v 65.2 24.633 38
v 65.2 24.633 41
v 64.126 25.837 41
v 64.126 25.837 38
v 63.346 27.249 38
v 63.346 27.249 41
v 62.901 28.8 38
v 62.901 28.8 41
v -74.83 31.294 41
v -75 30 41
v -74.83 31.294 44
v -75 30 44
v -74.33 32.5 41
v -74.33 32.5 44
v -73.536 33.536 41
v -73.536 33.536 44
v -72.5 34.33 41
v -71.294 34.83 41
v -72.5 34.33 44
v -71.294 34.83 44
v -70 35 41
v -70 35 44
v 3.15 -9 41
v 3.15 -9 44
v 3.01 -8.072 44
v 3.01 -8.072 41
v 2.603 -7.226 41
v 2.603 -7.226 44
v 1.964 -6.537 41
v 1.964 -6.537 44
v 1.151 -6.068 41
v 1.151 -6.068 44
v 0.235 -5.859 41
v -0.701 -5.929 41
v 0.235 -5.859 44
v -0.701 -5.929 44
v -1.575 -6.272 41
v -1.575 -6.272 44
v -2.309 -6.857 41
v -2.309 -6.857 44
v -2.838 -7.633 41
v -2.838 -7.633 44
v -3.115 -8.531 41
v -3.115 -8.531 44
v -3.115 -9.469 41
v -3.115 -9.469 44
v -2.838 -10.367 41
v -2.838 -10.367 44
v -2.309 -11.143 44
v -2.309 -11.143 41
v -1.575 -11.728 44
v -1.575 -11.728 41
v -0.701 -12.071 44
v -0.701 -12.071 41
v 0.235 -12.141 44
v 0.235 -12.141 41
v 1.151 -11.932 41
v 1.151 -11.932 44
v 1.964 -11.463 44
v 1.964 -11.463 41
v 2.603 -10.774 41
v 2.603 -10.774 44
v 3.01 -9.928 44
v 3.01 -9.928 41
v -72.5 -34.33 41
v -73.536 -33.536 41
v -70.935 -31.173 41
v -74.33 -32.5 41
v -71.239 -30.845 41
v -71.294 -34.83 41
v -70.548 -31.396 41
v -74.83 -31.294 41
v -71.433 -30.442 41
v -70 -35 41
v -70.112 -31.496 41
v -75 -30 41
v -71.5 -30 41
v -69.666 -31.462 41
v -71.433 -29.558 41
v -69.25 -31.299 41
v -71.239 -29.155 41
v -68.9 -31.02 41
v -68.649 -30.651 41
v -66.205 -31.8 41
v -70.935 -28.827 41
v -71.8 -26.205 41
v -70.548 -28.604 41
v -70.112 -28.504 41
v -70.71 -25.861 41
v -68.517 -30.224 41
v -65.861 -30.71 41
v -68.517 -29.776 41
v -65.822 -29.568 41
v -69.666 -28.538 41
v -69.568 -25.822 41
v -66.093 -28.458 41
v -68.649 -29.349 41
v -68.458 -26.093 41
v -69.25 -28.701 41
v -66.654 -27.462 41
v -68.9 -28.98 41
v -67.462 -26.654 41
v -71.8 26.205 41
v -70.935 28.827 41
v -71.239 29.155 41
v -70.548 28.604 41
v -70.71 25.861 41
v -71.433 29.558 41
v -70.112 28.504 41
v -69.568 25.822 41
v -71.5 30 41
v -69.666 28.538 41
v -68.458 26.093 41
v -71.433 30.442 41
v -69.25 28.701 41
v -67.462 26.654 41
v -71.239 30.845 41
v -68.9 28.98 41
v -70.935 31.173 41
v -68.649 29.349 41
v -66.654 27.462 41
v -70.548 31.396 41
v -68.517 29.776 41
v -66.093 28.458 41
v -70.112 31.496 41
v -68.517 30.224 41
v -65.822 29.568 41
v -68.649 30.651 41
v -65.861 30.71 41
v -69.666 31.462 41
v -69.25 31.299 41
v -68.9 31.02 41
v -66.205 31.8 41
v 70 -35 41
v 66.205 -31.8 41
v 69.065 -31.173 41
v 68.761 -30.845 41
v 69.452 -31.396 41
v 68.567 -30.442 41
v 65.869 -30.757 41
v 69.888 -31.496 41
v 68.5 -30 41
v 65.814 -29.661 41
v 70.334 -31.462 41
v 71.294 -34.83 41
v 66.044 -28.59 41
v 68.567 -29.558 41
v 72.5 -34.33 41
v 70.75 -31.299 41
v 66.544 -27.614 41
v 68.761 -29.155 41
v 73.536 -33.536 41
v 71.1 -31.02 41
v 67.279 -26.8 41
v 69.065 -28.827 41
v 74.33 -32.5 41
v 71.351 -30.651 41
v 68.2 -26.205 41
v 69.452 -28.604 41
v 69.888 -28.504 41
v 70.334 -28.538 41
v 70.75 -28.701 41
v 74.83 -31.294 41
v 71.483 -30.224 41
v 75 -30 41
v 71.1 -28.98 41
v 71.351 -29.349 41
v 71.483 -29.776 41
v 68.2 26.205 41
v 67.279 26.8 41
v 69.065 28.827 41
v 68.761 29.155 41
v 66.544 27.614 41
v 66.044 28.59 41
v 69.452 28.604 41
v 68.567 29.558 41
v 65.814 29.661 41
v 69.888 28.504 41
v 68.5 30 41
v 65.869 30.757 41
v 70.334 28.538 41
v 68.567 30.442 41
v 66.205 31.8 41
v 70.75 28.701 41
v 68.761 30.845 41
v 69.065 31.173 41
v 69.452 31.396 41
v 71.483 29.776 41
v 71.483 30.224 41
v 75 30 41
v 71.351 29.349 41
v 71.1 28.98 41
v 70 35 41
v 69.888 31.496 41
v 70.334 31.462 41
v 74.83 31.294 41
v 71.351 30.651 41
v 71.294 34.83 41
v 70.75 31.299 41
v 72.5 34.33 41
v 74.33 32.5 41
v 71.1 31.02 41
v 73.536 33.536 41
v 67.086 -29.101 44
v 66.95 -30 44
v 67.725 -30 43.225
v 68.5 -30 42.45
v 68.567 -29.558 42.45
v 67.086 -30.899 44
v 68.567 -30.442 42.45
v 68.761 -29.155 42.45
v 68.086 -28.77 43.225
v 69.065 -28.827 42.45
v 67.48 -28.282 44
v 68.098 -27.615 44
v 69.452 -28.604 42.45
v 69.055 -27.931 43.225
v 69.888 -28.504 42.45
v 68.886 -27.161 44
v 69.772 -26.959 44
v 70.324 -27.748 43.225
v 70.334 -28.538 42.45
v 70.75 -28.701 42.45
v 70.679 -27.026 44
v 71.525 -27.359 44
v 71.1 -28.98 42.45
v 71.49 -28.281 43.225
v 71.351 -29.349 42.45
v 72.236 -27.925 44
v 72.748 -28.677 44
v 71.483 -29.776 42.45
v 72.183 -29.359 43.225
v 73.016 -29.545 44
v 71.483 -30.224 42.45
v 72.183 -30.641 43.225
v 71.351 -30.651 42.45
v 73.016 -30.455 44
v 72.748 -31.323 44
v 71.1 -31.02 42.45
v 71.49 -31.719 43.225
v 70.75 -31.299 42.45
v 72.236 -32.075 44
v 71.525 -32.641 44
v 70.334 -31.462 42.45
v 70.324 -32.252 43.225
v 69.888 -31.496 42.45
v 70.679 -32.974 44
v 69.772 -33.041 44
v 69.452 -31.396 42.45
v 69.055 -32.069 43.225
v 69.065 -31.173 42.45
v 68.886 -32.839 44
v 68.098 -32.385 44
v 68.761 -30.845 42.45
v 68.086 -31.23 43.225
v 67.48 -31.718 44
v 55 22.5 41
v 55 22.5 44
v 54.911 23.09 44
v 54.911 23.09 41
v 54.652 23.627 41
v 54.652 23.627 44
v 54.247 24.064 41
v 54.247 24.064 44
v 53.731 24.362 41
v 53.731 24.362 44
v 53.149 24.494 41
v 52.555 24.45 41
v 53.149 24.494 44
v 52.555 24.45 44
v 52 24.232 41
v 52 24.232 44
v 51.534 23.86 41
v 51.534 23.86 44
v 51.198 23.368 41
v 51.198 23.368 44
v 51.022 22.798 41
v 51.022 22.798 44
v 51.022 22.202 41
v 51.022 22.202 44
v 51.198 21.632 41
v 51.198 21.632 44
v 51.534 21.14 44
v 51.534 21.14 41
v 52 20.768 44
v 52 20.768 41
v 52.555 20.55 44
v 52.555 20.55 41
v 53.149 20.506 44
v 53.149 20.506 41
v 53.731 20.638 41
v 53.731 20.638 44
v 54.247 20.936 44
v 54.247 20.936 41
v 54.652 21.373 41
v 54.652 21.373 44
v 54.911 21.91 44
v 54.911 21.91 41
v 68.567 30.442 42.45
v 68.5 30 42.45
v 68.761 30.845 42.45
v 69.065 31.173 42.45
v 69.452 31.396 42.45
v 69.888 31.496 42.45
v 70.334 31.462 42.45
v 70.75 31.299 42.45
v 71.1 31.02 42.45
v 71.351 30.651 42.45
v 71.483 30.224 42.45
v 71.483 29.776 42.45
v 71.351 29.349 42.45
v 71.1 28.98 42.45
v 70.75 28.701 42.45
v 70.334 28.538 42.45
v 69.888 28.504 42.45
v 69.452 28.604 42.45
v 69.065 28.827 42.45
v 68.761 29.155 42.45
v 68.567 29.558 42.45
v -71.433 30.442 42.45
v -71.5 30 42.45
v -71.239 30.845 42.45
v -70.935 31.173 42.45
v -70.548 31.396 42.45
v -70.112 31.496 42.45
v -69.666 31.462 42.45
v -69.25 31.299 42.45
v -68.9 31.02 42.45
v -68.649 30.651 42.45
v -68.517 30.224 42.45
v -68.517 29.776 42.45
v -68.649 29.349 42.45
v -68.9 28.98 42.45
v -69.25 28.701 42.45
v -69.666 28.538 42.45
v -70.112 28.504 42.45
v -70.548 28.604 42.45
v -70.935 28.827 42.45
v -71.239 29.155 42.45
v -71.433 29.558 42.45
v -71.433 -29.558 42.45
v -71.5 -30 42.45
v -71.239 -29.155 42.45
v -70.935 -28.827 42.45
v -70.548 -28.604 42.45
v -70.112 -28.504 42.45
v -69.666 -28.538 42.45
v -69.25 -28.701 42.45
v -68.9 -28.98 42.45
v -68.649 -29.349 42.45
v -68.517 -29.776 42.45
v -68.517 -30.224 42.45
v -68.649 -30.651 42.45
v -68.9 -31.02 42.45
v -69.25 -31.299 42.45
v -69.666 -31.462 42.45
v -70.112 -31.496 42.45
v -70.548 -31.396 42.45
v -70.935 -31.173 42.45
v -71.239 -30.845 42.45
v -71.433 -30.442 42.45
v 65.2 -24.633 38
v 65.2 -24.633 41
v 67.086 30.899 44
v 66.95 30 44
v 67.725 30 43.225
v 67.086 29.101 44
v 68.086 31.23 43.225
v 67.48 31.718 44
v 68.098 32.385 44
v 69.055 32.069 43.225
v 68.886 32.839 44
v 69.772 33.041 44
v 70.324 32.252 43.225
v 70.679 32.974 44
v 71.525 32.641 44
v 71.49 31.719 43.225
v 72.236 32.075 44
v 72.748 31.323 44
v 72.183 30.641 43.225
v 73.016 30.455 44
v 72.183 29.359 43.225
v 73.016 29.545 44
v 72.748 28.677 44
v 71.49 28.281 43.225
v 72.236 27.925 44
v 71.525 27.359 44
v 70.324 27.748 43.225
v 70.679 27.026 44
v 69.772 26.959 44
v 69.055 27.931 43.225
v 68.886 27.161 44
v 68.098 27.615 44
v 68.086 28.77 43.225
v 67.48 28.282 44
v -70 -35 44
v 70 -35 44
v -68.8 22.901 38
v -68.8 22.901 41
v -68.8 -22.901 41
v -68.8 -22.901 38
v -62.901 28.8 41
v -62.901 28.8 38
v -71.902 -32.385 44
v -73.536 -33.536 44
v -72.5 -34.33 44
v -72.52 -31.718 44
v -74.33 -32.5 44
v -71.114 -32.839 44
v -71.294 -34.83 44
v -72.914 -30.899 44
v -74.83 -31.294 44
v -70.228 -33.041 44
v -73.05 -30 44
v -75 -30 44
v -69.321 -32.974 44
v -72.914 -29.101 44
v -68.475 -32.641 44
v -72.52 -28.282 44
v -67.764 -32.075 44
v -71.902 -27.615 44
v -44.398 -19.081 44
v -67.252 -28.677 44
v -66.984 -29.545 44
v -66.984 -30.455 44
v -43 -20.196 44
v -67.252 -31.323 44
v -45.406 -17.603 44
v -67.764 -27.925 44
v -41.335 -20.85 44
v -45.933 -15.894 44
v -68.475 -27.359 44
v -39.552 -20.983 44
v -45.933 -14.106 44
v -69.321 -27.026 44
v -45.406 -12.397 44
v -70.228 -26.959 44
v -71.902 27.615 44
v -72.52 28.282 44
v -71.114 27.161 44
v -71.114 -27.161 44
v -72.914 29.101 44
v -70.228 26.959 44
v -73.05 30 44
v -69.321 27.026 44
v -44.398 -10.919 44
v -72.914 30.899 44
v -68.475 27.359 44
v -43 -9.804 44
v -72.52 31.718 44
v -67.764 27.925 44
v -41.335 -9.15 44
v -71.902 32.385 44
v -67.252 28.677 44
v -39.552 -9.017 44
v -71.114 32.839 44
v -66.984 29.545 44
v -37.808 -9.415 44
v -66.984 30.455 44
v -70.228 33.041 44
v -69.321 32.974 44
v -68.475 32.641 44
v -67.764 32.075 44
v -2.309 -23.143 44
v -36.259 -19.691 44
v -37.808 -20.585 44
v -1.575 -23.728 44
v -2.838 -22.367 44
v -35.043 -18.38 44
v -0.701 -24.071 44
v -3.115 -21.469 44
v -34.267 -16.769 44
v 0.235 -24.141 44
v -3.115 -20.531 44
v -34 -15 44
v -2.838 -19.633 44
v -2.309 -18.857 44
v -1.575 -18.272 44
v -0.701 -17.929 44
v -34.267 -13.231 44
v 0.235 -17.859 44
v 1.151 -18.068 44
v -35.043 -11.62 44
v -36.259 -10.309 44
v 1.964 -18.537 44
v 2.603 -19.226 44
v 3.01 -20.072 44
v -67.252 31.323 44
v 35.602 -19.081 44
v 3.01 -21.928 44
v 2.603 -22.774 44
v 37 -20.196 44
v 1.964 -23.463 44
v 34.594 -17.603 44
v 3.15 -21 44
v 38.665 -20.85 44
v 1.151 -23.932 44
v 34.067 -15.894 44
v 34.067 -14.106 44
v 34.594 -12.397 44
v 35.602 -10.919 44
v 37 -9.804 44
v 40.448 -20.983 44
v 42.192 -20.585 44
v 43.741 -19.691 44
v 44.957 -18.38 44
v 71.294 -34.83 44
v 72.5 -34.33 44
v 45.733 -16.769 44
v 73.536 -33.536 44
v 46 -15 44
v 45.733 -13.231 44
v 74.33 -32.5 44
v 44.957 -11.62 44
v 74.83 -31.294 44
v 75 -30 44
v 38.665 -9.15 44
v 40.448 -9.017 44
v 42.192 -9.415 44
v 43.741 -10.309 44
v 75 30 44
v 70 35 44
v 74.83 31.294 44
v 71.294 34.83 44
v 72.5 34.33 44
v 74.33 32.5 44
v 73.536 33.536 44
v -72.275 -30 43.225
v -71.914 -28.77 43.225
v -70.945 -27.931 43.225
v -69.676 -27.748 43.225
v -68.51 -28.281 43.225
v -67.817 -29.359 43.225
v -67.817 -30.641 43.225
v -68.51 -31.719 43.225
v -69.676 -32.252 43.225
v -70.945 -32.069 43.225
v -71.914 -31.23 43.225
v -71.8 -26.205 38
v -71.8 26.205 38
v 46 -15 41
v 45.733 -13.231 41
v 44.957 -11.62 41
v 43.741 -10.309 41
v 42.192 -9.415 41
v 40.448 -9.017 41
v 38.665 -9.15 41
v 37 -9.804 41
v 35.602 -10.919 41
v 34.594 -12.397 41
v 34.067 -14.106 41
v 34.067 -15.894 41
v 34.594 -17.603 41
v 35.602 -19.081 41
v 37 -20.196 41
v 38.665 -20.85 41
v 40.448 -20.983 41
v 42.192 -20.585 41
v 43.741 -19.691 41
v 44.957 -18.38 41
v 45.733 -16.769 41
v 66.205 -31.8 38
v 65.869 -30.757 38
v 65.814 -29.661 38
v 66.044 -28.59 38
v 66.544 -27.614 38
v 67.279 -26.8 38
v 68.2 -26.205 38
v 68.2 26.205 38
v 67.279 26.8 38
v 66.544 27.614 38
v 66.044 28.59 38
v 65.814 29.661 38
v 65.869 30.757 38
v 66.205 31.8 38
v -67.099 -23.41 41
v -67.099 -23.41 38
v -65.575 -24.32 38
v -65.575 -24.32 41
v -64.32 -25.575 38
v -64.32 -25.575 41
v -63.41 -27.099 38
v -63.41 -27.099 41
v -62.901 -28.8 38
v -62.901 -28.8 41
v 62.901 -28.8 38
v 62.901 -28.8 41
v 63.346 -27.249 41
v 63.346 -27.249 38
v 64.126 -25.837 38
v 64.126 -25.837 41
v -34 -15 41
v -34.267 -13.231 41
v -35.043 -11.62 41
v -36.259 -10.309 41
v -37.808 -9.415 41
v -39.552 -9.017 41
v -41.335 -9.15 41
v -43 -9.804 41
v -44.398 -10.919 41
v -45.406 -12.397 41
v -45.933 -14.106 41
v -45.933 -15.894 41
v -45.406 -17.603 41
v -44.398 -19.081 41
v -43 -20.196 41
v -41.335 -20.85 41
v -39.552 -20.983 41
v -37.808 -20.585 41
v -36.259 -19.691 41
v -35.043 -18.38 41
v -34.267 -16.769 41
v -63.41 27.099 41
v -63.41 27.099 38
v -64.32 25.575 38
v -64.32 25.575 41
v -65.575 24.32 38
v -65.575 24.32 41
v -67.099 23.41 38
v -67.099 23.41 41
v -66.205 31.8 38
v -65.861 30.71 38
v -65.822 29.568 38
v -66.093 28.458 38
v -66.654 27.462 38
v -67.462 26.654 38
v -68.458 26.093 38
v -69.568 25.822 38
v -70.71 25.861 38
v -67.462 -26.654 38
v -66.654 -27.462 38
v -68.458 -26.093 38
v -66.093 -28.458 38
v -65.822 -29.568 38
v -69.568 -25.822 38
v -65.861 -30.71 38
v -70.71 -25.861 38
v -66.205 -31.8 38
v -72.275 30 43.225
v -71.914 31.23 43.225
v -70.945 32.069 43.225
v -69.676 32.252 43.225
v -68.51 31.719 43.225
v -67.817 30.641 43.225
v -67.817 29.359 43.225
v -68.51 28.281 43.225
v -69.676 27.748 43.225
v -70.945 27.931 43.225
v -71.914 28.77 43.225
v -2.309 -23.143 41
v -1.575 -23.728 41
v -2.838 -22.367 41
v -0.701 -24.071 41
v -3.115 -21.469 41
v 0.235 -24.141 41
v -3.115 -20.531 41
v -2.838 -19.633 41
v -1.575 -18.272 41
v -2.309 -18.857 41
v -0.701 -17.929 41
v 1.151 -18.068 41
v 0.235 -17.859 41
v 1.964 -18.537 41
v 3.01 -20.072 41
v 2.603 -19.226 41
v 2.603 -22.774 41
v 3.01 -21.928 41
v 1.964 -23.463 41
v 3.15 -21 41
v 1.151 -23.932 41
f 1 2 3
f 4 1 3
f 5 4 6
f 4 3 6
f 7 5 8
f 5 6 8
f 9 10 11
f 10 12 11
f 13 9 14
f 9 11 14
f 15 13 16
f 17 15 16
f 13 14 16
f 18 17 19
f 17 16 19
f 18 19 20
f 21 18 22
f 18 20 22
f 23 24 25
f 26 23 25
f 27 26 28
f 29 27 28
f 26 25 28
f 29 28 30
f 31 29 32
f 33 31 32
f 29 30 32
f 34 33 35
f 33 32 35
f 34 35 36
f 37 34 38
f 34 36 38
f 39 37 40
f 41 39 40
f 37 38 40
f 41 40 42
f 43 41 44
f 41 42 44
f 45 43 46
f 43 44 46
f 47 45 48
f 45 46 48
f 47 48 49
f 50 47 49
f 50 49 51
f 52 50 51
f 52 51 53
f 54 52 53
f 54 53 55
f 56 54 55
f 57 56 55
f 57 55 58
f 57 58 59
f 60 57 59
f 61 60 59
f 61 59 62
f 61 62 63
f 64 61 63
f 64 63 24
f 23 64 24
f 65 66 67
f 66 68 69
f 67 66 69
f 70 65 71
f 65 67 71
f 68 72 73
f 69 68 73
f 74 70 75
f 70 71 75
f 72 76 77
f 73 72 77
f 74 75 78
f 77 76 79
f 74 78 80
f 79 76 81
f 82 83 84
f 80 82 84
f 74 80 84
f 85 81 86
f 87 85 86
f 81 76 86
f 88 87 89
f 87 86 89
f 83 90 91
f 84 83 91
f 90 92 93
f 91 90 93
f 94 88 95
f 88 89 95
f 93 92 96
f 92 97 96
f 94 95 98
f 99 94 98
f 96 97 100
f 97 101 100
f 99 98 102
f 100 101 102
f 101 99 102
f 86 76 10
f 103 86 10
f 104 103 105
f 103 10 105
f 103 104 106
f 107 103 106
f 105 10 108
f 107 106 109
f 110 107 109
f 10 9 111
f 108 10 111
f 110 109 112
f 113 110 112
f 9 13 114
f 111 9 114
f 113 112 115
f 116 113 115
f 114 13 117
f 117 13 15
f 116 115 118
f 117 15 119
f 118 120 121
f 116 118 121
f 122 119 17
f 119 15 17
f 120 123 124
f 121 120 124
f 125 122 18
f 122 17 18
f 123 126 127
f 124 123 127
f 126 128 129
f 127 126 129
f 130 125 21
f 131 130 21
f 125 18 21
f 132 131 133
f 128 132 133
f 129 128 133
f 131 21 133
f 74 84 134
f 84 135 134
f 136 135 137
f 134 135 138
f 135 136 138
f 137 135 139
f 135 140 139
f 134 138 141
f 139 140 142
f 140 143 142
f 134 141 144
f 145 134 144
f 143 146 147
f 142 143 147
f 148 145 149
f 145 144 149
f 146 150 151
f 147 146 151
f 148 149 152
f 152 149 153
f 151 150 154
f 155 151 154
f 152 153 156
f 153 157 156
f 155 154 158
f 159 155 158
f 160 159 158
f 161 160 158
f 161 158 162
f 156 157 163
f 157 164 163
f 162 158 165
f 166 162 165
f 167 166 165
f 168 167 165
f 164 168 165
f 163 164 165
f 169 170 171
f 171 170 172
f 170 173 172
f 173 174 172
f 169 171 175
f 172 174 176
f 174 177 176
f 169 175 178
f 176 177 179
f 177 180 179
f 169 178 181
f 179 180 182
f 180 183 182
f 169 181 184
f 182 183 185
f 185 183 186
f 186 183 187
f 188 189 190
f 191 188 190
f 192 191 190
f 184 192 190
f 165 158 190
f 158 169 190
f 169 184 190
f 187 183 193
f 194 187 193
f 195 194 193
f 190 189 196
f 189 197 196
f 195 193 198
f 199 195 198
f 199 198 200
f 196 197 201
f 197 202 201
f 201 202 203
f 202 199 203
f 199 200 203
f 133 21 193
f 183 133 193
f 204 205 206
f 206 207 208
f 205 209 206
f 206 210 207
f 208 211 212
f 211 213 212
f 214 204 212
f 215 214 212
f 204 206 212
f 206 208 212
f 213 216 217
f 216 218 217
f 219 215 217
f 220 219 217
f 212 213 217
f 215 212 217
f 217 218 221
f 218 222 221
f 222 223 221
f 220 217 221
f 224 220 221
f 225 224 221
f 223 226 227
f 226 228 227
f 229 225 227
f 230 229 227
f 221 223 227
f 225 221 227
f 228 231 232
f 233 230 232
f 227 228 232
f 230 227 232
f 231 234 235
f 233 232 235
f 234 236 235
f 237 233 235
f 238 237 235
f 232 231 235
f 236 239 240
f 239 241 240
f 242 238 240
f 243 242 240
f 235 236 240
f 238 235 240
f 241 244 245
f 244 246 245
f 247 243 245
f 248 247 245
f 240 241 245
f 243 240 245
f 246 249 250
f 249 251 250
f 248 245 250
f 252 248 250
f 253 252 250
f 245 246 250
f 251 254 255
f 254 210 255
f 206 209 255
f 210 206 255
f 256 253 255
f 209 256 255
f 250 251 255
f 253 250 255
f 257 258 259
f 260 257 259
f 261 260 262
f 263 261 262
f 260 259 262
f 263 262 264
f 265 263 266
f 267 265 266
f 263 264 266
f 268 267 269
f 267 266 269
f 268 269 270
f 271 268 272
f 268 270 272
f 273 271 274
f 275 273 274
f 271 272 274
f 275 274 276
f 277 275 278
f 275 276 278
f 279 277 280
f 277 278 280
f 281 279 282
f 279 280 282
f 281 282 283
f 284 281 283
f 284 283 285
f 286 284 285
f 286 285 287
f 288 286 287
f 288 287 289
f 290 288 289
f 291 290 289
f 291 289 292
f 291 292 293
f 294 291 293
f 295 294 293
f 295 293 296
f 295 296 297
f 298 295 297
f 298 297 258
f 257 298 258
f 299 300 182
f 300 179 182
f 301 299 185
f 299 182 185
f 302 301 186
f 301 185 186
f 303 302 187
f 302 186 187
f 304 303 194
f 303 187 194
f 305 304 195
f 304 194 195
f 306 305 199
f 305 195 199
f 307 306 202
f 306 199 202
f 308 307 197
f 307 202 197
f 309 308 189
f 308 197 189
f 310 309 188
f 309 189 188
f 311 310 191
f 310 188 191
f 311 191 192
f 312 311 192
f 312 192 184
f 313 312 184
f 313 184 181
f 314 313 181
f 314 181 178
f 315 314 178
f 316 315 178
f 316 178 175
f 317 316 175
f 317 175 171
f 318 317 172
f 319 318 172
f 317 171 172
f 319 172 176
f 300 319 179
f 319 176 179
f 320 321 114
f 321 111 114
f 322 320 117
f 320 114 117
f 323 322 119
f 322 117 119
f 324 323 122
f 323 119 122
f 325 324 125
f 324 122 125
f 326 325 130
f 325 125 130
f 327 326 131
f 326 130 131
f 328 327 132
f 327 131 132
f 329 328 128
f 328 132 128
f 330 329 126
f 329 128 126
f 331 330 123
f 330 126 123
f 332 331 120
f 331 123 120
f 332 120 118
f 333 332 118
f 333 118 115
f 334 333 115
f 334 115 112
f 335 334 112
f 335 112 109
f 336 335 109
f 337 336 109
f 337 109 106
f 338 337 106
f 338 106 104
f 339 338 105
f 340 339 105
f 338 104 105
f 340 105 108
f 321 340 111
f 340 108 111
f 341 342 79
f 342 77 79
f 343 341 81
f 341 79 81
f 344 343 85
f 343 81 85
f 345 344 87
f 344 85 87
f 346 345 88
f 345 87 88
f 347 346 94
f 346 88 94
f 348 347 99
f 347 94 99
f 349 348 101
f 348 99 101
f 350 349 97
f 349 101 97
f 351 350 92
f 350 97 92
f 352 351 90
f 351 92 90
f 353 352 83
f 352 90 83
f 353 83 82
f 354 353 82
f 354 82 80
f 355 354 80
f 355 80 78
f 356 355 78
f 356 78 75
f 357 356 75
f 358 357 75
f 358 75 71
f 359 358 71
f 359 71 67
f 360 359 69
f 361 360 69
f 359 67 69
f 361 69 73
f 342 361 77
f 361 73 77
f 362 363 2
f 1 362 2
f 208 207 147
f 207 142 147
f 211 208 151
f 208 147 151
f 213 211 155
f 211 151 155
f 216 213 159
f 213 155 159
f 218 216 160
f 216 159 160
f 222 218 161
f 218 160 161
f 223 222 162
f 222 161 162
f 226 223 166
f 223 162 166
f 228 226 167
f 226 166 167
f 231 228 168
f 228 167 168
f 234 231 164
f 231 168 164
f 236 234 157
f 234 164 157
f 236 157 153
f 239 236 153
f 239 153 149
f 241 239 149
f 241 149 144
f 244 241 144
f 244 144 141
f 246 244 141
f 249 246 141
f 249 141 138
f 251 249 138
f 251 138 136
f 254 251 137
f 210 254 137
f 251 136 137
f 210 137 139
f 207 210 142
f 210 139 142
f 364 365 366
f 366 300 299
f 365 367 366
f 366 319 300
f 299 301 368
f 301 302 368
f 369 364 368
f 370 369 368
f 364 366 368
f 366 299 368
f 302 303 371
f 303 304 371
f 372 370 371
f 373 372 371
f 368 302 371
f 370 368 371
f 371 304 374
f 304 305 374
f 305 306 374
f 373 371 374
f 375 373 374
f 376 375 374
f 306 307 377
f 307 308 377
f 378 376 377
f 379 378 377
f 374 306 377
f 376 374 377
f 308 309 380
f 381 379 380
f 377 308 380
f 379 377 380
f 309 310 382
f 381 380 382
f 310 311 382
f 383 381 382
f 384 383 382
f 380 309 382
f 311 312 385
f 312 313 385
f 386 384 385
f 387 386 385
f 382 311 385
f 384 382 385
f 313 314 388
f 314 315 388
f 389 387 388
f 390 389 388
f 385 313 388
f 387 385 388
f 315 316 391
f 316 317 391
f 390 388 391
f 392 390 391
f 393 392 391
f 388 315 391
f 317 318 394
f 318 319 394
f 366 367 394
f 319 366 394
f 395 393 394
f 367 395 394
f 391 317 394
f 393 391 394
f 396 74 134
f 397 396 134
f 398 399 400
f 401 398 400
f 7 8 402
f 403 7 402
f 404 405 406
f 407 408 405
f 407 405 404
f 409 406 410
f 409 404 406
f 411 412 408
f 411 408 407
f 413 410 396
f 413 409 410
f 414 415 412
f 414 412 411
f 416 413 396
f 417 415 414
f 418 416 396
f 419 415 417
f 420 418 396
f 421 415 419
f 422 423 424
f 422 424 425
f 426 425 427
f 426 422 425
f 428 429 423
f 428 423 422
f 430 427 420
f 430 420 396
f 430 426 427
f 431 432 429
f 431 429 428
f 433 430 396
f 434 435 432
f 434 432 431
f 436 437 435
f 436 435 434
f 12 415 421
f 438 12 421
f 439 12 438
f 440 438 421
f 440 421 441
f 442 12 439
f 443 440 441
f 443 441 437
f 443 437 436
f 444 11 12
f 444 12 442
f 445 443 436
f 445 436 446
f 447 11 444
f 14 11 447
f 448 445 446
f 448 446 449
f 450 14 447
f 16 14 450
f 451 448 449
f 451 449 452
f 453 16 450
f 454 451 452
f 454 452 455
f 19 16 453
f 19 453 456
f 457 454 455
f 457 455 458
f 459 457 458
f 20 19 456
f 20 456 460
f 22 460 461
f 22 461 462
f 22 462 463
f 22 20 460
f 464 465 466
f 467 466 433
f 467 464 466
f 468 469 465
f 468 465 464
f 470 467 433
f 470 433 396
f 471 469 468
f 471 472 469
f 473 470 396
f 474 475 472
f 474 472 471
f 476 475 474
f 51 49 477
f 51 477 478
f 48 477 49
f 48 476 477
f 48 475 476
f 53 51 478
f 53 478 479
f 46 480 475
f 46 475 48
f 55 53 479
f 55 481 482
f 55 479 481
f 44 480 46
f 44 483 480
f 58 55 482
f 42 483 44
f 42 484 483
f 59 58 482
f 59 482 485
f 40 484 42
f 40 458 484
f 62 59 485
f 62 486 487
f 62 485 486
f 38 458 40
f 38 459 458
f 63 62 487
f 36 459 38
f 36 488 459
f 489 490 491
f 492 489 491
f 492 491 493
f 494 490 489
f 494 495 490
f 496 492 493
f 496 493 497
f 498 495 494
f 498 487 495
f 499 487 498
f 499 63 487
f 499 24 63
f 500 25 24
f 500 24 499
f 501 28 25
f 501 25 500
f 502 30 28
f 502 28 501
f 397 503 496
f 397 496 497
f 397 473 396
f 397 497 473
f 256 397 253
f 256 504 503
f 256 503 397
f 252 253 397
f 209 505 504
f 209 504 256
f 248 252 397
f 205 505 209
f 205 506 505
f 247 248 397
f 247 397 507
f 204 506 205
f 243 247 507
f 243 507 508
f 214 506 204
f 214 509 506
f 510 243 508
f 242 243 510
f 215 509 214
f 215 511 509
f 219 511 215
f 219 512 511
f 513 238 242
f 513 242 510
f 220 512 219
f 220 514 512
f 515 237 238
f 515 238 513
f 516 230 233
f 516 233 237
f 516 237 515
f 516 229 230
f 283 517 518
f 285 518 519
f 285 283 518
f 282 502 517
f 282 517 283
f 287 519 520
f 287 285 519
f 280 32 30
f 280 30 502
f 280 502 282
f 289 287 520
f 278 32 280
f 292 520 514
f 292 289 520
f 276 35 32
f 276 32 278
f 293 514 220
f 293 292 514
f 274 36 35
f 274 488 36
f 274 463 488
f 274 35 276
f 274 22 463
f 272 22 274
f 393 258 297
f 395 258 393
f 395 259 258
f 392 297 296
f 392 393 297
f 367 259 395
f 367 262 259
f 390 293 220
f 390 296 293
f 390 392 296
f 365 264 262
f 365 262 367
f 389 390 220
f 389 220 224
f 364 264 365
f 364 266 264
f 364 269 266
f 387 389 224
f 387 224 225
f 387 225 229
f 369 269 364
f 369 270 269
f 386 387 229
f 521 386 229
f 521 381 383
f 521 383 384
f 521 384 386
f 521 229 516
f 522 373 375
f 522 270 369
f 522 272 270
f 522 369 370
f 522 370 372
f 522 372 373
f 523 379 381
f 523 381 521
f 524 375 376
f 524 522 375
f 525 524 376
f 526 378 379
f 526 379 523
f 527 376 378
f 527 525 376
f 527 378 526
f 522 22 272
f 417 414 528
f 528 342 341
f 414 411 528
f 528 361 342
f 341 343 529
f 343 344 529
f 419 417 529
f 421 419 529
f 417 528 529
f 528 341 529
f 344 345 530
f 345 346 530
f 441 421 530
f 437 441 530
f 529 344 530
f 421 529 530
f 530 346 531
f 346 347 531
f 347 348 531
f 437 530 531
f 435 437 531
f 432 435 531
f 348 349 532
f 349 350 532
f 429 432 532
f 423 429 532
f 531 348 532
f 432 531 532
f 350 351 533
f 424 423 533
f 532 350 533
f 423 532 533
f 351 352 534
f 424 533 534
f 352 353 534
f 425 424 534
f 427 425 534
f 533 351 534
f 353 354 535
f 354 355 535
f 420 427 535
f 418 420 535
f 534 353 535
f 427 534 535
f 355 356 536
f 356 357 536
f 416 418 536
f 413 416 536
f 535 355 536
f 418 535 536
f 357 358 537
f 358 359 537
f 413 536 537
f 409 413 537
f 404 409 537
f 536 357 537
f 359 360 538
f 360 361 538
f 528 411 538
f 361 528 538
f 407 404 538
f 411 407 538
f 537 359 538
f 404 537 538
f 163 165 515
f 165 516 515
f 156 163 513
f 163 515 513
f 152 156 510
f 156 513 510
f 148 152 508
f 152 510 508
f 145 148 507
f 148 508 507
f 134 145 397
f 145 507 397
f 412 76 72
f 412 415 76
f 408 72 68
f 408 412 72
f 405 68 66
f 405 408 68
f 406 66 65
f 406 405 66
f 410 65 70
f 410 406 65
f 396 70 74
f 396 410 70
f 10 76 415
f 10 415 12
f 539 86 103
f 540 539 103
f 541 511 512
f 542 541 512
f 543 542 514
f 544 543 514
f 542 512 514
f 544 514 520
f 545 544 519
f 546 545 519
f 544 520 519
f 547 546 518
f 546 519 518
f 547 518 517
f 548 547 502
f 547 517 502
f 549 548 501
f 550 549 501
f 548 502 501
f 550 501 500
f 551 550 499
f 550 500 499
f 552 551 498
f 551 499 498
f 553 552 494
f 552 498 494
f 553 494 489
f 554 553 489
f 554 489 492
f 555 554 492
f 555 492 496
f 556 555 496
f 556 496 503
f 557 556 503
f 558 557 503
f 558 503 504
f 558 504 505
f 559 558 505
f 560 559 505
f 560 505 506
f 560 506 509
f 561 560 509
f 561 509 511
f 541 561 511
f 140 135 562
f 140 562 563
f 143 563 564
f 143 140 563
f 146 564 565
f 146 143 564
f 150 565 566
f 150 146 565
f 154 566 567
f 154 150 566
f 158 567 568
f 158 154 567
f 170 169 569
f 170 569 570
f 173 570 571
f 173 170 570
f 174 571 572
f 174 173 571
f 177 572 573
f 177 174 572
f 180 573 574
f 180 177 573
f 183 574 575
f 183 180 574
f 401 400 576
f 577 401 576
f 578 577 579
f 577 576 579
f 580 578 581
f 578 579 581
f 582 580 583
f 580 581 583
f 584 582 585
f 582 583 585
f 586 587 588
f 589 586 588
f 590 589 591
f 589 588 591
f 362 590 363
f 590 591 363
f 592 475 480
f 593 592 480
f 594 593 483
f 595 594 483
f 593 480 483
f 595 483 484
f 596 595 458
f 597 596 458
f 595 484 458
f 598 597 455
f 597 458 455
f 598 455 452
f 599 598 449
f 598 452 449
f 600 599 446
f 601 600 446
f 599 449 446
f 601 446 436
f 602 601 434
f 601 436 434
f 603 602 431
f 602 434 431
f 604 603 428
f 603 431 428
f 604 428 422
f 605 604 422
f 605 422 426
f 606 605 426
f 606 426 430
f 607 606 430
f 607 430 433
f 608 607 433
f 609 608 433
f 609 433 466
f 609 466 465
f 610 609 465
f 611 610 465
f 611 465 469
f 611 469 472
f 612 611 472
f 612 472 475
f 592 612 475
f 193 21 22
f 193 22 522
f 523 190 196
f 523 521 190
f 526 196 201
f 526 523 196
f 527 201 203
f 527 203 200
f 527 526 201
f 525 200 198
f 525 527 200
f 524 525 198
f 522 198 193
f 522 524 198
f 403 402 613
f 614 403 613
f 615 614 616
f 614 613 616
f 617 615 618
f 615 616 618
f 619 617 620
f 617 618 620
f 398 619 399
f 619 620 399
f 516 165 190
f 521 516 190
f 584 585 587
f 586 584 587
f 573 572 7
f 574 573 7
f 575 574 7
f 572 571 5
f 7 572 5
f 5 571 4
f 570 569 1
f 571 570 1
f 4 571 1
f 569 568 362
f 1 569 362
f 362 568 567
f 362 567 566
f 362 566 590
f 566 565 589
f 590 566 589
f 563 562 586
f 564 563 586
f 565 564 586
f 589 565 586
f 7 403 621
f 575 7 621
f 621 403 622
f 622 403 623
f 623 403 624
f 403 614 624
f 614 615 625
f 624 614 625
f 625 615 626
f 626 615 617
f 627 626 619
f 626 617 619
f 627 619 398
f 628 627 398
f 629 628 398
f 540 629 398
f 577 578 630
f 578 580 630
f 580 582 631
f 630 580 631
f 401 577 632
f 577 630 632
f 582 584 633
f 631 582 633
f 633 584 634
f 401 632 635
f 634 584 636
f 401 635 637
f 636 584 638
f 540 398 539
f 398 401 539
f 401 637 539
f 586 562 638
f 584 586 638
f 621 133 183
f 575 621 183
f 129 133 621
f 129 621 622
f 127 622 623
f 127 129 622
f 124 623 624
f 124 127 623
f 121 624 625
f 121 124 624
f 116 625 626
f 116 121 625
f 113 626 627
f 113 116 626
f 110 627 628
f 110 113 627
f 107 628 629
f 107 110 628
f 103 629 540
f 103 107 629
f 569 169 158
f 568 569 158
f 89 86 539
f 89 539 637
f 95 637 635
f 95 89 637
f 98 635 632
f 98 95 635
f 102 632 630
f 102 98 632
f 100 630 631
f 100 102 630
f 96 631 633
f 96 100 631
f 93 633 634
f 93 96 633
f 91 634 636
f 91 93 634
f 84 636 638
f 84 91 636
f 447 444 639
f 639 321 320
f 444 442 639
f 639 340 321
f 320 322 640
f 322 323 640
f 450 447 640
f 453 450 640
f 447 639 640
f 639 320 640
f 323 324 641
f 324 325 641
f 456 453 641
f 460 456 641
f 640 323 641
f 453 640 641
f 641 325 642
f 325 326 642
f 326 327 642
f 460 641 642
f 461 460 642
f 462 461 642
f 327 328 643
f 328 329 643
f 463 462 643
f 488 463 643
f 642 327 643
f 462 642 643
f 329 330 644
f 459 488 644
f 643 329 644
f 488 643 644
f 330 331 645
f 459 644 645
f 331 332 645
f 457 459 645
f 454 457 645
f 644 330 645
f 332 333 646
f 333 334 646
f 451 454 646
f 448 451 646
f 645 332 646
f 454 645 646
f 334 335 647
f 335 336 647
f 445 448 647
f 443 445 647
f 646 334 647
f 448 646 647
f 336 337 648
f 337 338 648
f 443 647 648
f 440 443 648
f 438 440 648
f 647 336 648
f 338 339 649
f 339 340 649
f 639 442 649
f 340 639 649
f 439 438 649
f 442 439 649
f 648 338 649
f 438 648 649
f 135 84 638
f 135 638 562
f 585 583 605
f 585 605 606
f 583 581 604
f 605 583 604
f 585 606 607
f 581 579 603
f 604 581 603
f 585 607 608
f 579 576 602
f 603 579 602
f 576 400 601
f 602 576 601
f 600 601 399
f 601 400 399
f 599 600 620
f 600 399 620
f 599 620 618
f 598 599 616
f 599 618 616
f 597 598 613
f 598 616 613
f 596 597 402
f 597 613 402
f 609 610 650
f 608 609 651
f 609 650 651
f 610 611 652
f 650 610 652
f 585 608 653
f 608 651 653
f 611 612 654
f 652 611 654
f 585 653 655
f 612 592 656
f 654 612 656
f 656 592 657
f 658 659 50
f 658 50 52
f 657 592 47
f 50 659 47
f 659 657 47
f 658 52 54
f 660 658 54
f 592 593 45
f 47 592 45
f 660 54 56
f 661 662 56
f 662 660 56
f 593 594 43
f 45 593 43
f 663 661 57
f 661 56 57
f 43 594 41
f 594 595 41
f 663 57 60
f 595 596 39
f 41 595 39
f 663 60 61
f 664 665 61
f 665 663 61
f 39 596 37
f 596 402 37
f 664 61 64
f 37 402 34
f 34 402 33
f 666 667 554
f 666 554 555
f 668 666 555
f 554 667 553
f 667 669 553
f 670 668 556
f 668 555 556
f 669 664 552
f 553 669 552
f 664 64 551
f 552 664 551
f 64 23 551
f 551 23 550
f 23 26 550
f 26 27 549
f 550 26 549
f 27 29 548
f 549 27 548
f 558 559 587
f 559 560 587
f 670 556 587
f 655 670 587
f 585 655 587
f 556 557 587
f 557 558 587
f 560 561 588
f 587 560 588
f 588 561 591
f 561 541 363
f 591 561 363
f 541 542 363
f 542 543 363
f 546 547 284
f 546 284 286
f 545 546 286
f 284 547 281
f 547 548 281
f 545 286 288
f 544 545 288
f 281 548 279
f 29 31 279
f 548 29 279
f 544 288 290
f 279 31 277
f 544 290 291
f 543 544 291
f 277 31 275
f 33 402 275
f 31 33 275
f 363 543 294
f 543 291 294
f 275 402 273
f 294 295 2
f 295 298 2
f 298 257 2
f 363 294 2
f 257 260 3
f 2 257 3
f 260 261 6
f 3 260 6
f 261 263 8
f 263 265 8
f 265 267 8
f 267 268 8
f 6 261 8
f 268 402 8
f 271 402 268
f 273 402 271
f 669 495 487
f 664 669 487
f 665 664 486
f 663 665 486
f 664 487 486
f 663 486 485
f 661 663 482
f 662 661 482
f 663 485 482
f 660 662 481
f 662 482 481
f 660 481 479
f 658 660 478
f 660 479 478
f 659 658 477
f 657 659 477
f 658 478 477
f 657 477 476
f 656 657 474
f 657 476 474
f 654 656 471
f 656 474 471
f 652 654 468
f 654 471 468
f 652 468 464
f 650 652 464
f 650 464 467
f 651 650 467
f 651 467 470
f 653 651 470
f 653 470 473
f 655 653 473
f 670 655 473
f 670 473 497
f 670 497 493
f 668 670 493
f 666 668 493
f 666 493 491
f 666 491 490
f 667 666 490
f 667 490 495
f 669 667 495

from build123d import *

# Parameters (mm, degrees)
SKETCH002_W      = 150
SKETCH002_H      = 70
PAD002_DEPTH     = 3
PAD003_DEPTH     = 3
HOLE_D           = 3
HOLE_DEPTH       = 25
HOLE_CSINK_D     = 6.1
HOLE_CSINK_ANGLE = 90
FILLET001_R      = 5
SKETCH009_R      = 6
SKETCH009_R_2    = 3.15
SKETCH009_R_3    = 2
POCKET003_DEPTH  = 5


with BuildPart() as part:
    # Sketch002 → Pad002 (new body)
    with BuildSketch(Plane.XY.offset(41)):
        Rectangle(SKETCH002_W, SKETCH002_H)
    extrude(amount=PAD002_DEPTH)

    # Sketch003 (on Face5 of Pad002) → Pad003 (join)
    with BuildSketch(Plane(origin=(0, 0, 41), x_dir=(1, 0, 0), z_dir=(0, 0, -1))):
        with BuildLine():
            Line((-66.205267, 31.8), (66.205267, 31.8))
            ThreePointArc((66.205267, 31.8), (66.043926, 28.589511), (68.2, 26.205267))
            Line((68.2, -26.205267), (68.2, 26.205267))
            ThreePointArc((68.2, -26.205267), (66.043926, -28.589511), (66.205267, -31.8))
            Line((-66.205267, -31.8), (66.205267, -31.8))
            ThreePointArc((-66.205267, -31.8), (-67.030152, -27.030152), (-71.8, -26.205267))
            Line((-71.8, 26.205267), (-71.8, -26.205267))
            ThreePointArc((-71.8, 26.205267), (-67.030152, 27.030152), (-66.205267, 31.8))
        make_face()
        with BuildLine():
            Line((-62.900704, 28.8), (62.900704, 28.8))
            ThreePointArc((62.900704, 28.8), (63.696162, 26.521261), (65.2, 24.633437))
            Line((65.2, 24.633437), (65.2, -24.633437))
            ThreePointArc((65.2, -24.633437), (63.696162, -26.521261), (62.900704, -28.8))
            Line((62.900704, -28.8), (-62.900704, -28.8))
            ThreePointArc((-62.900704, -28.8), (-64.908831, -24.908831), (-68.8, -22.900704))
            Line((-68.8, -22.900704), (-68.8, 22.900704))
            ThreePointArc((-68.8, 22.900704), (-64.908831, 24.908831), (-62.900704, 28.8))
        make_face(mode=Mode.SUBTRACT)
    extrude(amount=PAD003_DEPTH)

    # Hole
    with Locations(Plane.XY.offset(44)):
        with Locations((-70, 30), (70, 30), (70, -30), (-70, -30)):
            CounterSinkHole(HOLE_D / 2, HOLE_CSINK_D / 2, depth=HOLE_DEPTH, counter_sink_angle=HOLE_CSINK_ANGLE)

    # Fillet001
    fillet001_edges = [part.edges().sort_by_distance(p)[0] for p in [
        (-75, -35, 42.5),
        (75, -35, 42.5),
        (-75, 35, 42.5),
        (75, 35, 42.5),
    ]]
    fillet(fillet001_edges, radius=FILLET001_R)

    # Sketch009 (on Face5 of Fillet001) → Pocket003 (cut)
    with BuildSketch(Plane.XY.offset(44)):
        with Locations((40, -15)):
            Circle(SKETCH009_R)
        with Locations((-40, -15)):
            Circle(SKETCH009_R)
        with Locations((0, -9)):
            Circle(SKETCH009_R_2)
        with Locations((0, -21)):
            Circle(SKETCH009_R_2)
        with Locations((53, 22.5)):
            Circle(SKETCH009_R_3)
    extrude(amount=-POCKET003_DEPTH, mode=Mode.SUBTRACT)


solid = part.part
